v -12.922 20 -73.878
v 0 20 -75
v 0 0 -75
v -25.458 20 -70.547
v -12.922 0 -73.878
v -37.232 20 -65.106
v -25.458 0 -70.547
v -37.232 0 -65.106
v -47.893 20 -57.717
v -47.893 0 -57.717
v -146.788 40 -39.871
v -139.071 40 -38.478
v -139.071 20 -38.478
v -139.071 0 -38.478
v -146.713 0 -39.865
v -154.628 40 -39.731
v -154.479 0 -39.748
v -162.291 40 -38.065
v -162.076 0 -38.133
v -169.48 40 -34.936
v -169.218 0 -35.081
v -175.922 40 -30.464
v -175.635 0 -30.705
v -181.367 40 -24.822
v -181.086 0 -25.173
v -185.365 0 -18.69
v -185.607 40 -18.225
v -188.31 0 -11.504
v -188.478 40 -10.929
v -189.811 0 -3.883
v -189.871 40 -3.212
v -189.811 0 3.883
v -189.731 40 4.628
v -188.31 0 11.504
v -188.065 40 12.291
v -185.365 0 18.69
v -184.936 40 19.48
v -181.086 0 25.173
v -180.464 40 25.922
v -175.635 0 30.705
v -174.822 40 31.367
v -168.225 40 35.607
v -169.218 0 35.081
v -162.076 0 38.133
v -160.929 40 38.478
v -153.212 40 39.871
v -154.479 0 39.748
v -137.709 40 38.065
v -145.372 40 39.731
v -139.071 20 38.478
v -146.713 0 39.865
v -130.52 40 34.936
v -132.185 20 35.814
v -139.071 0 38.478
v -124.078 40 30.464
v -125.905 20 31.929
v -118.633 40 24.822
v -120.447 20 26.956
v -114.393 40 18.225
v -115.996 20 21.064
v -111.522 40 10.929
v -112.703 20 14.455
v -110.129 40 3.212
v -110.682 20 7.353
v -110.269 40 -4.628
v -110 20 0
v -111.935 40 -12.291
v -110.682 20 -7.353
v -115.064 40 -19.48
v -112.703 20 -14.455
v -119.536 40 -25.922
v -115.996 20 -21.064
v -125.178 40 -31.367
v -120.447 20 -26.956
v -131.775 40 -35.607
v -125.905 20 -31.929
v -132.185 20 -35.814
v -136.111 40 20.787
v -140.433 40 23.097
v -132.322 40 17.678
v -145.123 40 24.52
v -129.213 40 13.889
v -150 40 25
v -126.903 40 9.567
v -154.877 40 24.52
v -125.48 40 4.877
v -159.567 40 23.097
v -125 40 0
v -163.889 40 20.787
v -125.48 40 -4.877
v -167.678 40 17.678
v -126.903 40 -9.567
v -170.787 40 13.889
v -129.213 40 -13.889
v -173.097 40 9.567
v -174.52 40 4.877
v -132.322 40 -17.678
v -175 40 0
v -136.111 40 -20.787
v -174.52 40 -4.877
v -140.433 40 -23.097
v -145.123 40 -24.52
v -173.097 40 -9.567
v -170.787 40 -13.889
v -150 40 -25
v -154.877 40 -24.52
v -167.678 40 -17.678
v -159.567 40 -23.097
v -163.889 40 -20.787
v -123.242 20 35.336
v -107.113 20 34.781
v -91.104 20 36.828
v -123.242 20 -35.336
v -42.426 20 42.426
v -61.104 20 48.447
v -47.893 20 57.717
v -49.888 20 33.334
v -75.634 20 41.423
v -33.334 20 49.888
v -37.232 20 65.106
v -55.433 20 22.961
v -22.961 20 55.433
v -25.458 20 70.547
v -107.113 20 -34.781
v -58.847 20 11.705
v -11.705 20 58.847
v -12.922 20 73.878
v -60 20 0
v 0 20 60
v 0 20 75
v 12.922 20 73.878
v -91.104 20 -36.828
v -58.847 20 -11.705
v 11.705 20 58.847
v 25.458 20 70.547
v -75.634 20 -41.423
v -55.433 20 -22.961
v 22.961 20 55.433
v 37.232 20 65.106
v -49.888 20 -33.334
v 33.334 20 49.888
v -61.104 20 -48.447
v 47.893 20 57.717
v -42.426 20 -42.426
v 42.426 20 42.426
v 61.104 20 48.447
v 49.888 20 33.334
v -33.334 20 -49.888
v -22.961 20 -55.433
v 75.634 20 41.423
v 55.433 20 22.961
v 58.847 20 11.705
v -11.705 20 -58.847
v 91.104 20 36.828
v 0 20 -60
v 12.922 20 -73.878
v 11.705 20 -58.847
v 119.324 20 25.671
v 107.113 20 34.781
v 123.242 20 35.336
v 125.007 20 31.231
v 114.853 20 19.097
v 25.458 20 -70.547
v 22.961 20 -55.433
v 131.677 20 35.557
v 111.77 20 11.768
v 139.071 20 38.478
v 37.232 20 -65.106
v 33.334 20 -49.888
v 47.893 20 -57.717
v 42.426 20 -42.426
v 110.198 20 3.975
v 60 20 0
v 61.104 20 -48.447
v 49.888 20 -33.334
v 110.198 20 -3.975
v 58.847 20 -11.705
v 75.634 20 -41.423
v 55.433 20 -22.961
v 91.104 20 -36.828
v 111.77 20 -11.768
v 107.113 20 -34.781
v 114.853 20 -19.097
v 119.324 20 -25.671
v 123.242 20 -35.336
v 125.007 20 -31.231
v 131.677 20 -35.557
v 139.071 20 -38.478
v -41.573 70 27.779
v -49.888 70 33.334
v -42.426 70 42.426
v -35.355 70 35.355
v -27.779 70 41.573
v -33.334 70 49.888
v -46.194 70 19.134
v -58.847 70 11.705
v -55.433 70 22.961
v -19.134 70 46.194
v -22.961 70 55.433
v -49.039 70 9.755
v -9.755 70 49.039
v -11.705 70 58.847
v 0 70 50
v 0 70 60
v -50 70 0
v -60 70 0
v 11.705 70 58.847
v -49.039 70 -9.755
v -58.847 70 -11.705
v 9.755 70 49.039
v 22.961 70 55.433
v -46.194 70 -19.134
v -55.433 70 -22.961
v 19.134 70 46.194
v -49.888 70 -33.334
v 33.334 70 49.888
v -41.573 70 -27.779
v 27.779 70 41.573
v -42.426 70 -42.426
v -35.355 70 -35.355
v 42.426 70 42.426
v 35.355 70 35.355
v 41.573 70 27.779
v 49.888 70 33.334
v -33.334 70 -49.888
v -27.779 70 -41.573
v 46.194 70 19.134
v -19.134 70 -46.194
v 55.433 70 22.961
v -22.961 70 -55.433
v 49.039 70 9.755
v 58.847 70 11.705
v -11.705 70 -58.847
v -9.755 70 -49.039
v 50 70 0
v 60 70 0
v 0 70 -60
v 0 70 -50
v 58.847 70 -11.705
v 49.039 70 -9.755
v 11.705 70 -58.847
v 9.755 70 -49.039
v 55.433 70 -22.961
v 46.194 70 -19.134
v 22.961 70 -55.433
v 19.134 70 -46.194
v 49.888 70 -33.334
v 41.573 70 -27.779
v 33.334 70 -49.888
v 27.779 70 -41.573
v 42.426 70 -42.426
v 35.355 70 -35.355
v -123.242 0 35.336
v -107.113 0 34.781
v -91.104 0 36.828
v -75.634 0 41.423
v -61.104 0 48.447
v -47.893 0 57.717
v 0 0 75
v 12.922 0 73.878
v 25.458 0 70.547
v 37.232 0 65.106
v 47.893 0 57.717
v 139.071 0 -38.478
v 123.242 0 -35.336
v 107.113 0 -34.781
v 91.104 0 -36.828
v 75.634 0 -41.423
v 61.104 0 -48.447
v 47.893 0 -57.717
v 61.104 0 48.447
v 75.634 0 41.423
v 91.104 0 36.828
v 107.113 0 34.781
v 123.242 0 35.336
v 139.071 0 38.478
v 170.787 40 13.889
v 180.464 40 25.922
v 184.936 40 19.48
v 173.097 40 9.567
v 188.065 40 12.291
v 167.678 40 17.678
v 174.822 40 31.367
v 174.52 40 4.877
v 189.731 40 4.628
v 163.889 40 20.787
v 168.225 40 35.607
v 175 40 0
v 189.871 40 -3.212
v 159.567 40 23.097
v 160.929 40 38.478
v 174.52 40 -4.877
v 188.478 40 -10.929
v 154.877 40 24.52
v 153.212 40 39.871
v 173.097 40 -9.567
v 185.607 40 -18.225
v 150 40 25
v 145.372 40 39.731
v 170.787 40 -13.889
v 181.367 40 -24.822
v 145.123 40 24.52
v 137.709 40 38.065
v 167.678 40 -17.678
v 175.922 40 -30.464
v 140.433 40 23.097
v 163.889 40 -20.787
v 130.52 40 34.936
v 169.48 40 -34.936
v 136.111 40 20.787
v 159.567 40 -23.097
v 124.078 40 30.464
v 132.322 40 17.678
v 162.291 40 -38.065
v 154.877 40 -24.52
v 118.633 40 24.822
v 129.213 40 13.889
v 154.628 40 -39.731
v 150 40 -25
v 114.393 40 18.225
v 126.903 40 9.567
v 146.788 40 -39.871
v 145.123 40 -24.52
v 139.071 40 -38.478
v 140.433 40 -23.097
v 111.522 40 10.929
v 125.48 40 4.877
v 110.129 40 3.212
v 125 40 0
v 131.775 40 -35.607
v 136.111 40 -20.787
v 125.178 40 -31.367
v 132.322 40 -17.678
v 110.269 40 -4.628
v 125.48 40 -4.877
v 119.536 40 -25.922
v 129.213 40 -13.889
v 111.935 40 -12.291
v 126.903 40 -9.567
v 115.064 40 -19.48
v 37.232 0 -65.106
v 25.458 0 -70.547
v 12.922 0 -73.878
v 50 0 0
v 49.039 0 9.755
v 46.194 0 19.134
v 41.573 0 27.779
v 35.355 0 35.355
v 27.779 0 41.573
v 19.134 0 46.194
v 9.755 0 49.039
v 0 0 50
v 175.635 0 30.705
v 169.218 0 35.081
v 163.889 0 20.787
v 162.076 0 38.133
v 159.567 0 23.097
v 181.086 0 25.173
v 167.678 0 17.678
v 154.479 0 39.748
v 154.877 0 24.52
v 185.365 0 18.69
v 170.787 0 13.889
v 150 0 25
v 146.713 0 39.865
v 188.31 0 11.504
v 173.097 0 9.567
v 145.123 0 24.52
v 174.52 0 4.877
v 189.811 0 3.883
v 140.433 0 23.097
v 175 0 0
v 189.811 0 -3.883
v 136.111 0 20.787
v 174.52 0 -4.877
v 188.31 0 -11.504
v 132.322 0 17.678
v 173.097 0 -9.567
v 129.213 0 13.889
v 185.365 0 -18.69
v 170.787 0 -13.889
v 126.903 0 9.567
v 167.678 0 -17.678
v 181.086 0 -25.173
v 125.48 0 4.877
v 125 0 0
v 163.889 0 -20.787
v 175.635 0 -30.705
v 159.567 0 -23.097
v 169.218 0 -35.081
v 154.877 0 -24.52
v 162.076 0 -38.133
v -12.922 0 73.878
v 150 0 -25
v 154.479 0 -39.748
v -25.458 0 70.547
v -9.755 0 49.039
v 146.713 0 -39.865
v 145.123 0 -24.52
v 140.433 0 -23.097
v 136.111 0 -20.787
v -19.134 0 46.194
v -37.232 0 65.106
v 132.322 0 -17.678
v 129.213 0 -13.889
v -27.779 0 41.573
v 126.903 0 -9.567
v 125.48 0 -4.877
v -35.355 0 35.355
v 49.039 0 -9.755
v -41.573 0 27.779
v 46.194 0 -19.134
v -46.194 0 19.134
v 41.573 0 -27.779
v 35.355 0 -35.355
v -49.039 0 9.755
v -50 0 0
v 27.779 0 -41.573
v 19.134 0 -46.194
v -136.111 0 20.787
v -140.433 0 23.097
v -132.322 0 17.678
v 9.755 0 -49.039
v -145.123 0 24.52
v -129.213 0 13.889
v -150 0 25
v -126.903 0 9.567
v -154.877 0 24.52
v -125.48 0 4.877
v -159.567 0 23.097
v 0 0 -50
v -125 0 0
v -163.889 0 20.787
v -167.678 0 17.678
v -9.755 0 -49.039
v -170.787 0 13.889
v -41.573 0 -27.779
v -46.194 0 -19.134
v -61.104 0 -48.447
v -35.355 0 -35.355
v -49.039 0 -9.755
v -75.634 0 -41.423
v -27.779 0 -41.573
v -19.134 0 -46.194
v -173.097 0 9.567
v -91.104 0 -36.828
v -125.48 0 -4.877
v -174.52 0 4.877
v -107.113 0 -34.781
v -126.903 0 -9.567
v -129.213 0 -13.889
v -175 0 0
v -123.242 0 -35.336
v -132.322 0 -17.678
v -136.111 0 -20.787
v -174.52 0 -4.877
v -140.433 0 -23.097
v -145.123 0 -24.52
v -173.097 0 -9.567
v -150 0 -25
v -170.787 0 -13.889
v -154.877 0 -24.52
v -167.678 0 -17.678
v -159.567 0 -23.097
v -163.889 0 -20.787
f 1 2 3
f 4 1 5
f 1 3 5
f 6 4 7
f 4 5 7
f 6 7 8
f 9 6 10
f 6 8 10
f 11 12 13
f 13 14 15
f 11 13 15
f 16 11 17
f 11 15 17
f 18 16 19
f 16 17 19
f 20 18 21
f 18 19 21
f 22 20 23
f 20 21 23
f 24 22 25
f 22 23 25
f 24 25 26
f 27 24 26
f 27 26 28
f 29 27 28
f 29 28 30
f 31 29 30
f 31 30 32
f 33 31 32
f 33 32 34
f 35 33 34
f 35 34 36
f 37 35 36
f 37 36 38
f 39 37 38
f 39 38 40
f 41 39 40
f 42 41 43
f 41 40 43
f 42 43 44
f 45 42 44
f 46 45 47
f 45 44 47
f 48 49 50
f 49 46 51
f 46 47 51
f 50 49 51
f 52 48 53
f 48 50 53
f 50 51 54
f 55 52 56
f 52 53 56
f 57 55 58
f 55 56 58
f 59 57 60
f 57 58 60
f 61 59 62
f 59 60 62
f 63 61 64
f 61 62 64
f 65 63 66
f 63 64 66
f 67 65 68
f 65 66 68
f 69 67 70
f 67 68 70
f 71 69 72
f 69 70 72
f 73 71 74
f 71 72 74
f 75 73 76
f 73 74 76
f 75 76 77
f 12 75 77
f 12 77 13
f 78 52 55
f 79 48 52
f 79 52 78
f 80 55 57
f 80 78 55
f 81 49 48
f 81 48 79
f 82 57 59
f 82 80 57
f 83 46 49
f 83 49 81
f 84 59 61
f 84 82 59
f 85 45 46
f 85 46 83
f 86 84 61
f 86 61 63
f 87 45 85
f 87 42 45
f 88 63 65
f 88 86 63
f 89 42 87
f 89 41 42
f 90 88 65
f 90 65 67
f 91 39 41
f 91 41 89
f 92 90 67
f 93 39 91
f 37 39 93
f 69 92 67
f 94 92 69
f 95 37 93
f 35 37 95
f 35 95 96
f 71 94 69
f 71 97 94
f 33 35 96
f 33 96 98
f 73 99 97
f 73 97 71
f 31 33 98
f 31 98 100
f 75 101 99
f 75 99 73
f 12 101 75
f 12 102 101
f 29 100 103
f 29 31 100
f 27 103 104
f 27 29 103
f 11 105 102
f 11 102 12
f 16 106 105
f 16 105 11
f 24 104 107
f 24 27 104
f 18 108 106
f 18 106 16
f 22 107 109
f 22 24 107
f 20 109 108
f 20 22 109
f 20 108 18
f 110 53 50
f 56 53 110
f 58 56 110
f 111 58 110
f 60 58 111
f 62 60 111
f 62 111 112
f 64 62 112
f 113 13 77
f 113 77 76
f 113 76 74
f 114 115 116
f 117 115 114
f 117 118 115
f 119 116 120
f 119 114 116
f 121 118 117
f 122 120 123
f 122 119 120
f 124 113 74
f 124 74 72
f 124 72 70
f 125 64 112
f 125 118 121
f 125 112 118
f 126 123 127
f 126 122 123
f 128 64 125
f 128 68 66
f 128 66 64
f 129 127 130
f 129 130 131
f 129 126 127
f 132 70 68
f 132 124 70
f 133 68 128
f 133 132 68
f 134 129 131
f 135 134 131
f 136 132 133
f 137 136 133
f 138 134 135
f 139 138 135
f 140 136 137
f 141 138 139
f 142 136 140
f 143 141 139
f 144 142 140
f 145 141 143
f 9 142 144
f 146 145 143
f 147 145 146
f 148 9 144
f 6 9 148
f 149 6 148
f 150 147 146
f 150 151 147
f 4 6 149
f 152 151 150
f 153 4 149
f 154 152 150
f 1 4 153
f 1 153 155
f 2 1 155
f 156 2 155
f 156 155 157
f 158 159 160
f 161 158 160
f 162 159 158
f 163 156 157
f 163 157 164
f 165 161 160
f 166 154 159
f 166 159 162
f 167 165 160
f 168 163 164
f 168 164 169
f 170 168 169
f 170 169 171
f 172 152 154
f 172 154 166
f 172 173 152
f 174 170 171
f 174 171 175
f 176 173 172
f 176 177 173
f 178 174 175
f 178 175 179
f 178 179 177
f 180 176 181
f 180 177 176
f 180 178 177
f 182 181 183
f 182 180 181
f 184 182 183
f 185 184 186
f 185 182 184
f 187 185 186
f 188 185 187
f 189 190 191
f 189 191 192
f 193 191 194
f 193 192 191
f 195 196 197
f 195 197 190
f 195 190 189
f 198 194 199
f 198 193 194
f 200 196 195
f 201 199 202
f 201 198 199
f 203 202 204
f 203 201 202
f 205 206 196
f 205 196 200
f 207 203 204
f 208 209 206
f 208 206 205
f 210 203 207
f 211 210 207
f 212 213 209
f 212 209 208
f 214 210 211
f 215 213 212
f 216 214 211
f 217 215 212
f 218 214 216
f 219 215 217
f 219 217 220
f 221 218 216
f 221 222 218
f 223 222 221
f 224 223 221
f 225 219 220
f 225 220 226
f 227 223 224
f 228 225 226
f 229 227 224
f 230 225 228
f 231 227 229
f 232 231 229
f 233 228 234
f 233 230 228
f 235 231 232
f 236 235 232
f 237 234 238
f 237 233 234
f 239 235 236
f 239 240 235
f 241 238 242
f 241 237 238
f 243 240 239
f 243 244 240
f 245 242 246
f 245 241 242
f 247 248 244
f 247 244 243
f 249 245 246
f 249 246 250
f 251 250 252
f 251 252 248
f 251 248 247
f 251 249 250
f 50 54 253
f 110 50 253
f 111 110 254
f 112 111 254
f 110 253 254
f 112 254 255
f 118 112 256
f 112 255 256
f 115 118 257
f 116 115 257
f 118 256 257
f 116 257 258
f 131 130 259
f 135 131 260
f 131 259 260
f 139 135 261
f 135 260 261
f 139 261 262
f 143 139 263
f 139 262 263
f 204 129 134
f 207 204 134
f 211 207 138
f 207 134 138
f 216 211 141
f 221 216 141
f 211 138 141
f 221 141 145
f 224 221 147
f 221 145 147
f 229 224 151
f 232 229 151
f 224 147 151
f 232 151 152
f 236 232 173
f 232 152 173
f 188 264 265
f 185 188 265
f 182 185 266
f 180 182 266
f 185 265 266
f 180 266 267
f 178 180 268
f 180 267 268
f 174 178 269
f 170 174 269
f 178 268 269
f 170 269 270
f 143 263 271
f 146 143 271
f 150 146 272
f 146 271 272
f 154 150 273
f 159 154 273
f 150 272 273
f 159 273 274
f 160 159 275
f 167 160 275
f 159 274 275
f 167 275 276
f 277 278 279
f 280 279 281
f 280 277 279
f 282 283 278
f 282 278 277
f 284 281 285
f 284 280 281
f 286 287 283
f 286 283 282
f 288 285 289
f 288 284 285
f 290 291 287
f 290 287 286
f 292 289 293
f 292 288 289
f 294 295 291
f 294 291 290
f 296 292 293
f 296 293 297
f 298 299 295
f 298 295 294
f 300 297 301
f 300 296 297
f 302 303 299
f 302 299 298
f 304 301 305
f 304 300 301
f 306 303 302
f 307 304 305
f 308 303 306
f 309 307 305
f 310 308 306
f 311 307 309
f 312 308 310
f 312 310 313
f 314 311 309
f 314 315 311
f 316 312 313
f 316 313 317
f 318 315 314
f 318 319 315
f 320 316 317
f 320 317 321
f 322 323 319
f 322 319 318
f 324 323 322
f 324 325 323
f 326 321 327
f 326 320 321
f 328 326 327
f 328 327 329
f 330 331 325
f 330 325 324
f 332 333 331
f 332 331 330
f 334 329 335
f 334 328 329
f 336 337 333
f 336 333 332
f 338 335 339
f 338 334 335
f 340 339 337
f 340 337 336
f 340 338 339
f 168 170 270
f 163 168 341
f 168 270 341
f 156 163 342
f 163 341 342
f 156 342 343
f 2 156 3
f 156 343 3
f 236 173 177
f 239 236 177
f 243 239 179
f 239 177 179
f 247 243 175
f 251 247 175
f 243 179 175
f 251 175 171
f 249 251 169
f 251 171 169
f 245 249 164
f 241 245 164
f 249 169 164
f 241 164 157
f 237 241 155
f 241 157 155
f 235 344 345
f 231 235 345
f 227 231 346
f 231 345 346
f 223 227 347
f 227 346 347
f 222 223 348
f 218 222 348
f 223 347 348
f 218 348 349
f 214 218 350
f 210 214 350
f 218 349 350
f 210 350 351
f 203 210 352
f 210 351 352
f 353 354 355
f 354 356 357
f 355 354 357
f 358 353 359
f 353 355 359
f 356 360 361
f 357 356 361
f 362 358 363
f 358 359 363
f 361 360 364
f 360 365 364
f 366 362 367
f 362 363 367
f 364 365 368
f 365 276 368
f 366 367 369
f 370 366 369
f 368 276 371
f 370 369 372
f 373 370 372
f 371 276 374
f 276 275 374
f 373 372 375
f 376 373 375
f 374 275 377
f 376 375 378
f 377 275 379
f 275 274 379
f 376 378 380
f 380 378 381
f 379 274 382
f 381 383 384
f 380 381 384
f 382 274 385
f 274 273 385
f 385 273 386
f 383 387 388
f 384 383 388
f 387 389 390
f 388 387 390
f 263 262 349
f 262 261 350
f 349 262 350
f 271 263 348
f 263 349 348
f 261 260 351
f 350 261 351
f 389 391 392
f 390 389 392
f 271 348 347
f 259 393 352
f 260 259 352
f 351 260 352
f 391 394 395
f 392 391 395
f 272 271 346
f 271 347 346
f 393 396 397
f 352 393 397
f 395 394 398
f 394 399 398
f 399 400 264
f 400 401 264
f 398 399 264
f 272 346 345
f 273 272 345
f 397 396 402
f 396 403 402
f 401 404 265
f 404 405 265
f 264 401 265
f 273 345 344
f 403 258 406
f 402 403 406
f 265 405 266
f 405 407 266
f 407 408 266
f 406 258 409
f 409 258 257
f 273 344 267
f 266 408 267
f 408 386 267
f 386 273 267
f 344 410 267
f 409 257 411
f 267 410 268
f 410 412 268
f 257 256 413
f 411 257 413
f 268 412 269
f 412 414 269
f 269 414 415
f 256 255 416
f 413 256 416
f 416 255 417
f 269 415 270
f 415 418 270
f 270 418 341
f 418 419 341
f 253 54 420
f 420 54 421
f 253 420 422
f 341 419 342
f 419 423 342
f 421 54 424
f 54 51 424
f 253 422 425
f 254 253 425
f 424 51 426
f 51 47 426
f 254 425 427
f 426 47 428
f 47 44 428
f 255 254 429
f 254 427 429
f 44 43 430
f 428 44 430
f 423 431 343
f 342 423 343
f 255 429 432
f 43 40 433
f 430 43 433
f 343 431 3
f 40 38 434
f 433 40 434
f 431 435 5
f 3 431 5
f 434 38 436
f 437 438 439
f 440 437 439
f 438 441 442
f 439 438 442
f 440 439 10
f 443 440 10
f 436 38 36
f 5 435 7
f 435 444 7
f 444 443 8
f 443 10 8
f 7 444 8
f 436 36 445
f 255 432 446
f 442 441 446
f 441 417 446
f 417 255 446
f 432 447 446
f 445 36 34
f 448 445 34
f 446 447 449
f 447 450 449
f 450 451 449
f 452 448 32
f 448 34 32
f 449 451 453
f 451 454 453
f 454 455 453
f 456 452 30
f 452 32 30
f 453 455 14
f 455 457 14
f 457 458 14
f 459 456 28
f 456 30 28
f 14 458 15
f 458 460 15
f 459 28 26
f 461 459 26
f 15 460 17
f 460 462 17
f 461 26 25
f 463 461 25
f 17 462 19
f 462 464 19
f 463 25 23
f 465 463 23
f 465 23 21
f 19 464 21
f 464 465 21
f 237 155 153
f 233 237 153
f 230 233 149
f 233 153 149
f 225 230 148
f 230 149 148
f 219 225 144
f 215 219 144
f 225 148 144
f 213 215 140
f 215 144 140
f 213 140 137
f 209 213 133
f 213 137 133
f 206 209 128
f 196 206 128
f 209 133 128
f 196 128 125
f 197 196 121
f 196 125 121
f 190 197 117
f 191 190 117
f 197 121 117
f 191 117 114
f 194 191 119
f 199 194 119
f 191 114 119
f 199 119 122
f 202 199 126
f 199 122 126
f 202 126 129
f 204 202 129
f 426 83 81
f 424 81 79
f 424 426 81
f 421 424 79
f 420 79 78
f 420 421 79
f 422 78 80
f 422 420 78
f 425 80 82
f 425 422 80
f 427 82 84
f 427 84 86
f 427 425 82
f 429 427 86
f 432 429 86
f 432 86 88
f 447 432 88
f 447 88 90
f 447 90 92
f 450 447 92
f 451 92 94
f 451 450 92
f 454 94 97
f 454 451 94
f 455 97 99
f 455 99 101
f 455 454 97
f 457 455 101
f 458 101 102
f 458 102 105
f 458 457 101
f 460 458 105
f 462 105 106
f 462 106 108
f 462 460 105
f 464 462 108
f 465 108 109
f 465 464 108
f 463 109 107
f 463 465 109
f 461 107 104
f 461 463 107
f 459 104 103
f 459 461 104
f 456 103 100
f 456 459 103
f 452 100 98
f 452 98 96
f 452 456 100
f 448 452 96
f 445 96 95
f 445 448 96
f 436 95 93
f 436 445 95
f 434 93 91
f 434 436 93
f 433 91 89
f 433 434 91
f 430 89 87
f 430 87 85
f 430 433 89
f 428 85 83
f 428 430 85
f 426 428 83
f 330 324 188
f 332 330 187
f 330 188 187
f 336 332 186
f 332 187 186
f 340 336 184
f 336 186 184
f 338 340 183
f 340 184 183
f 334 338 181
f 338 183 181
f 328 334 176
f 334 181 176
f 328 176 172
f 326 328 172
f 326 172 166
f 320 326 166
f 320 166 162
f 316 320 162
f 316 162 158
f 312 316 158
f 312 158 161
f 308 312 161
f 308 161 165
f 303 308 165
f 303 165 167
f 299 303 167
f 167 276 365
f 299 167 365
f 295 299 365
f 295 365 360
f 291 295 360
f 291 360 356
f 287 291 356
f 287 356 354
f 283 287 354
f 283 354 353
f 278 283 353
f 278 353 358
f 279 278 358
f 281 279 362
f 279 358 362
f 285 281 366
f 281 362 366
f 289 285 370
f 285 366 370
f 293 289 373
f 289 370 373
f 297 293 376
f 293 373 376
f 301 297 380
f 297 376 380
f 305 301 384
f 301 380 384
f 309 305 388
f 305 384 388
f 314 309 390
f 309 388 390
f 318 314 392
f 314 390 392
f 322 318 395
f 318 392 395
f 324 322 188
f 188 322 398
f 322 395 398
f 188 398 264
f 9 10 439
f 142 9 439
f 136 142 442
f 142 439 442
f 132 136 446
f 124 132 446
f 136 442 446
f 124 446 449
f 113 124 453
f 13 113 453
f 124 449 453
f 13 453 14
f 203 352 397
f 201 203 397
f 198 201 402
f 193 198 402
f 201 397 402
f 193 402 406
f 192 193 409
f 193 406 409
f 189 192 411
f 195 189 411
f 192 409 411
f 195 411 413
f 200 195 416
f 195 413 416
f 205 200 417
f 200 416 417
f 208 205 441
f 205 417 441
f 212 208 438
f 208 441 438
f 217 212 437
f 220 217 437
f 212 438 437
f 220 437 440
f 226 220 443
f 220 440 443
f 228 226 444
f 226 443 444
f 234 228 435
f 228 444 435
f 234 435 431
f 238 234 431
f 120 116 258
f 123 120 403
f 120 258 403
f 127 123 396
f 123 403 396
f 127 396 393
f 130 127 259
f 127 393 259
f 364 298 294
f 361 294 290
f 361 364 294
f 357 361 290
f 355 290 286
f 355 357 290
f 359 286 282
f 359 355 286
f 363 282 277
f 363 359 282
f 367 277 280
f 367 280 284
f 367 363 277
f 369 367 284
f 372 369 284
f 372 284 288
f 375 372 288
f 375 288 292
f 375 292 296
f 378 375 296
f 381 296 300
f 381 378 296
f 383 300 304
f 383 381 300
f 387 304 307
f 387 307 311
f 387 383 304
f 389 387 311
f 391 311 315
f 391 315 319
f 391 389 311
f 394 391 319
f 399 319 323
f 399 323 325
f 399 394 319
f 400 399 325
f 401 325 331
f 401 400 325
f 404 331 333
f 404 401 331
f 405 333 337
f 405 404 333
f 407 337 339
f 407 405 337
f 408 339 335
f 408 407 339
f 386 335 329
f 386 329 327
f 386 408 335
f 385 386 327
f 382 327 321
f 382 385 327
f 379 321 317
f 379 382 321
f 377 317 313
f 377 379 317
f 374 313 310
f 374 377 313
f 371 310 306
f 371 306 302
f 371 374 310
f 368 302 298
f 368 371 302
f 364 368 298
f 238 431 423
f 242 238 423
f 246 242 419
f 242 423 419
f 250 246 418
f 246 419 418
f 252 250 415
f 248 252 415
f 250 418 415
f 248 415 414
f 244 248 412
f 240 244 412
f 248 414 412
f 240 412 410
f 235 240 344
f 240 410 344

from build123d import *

# Parameters (mm, degrees)
SKETCH1_R           = 60
BOSS_EXTRUDE1_DEPTH = 20
SKETCH1_3_R         = 40
SKETCH1_3_R_2       = 25
BOSS_EXTRUDE2_DEPTH = 40
SKETCH1_4_R         = 60
SKETCH1_4_R_2       = 50
BOSS_EXTRUDE3_DEPTH = 70


with BuildPart() as part:
    # Sketch1 → Boss-Extrude1 (new body)
    with BuildSketch(Plane(origin=(0, 0, 0), x_dir=(1, 0, 0), z_dir=(0, 1, 0))):
        with BuildLine():
            ThreePointArc((-47.892857143, -57.717191847), (0, -75), (47.892857143, -57.717191847))
            ThreePointArc((47.892857143, -57.717191847), (91.104177178, -36.827906099), (139.071428571, -38.478127898))
            ThreePointArc((139.071428571, -38.478127898), (110, 0), (139.071428571, 38.478127898))
            ThreePointArc((139.071428571, 38.478127898), (91.104177178, 36.827906099), (47.892857143, 57.717191847))
            ThreePointArc((47.892857143, 57.717191847), (0, 75), (-47.892857143, 57.717191847))
            ThreePointArc((-47.892857143, 57.717191847), (-91.104177178, 36.827906099), (-139.071428571, 38.478127898))
            ThreePointArc((-139.071428571, 38.478127898), (-110, 0), (-139.071428571, -38.478127898))
            ThreePointArc((-139.071428571, -38.478127898), (-91.104177178, -36.827906099), (-47.892857143, -57.717191847))
        make_face()
        Circle(SKETCH1_R, mode=Mode.SUBTRACT)
    extrude(amount=BOSS_EXTRUDE1_DEPTH)

    # Sketch1<3> → Boss-Extrude2 (add)
    # profile 1 of 2: a face of its own
    with BuildSketch(Plane(origin=(0, 0, 0), x_dir=(1, 0, 0), z_dir=(0, 1, 0))):
        with Locations((-150, 0)):
            Circle(SKETCH1_3_R)
        with Locations((-150, 0)):
            Circle(SKETCH1_3_R_2, mode=Mode.SUBTRACT)
    # profile 2 of 2: a face of its own
    with BuildSketch(Plane(origin=(0, 0, 0), x_dir=(1, 0, 0), z_dir=(0, 1, 0))):
        with Locations((150, 0)):
            Circle(SKETCH1_3_R)
        with Locations((150, 0)):
            Circle(SKETCH1_3_R_2, mode=Mode.SUBTRACT)
    extrude(amount=BOSS_EXTRUDE2_DEPTH)

    # Sketch1<4> → Boss-Extrude3 (add)
    with BuildSketch(Plane(origin=(0, 0, 0), x_dir=(1, 0, 0), z_dir=(0, 1, 0))):
        Circle(SKETCH1_4_R)
        Circle(SKETCH1_4_R_2, mode=Mode.SUBTRACT)
    extrude(amount=BOSS_EXTRUDE3_DEPTH)


solid = part.part
